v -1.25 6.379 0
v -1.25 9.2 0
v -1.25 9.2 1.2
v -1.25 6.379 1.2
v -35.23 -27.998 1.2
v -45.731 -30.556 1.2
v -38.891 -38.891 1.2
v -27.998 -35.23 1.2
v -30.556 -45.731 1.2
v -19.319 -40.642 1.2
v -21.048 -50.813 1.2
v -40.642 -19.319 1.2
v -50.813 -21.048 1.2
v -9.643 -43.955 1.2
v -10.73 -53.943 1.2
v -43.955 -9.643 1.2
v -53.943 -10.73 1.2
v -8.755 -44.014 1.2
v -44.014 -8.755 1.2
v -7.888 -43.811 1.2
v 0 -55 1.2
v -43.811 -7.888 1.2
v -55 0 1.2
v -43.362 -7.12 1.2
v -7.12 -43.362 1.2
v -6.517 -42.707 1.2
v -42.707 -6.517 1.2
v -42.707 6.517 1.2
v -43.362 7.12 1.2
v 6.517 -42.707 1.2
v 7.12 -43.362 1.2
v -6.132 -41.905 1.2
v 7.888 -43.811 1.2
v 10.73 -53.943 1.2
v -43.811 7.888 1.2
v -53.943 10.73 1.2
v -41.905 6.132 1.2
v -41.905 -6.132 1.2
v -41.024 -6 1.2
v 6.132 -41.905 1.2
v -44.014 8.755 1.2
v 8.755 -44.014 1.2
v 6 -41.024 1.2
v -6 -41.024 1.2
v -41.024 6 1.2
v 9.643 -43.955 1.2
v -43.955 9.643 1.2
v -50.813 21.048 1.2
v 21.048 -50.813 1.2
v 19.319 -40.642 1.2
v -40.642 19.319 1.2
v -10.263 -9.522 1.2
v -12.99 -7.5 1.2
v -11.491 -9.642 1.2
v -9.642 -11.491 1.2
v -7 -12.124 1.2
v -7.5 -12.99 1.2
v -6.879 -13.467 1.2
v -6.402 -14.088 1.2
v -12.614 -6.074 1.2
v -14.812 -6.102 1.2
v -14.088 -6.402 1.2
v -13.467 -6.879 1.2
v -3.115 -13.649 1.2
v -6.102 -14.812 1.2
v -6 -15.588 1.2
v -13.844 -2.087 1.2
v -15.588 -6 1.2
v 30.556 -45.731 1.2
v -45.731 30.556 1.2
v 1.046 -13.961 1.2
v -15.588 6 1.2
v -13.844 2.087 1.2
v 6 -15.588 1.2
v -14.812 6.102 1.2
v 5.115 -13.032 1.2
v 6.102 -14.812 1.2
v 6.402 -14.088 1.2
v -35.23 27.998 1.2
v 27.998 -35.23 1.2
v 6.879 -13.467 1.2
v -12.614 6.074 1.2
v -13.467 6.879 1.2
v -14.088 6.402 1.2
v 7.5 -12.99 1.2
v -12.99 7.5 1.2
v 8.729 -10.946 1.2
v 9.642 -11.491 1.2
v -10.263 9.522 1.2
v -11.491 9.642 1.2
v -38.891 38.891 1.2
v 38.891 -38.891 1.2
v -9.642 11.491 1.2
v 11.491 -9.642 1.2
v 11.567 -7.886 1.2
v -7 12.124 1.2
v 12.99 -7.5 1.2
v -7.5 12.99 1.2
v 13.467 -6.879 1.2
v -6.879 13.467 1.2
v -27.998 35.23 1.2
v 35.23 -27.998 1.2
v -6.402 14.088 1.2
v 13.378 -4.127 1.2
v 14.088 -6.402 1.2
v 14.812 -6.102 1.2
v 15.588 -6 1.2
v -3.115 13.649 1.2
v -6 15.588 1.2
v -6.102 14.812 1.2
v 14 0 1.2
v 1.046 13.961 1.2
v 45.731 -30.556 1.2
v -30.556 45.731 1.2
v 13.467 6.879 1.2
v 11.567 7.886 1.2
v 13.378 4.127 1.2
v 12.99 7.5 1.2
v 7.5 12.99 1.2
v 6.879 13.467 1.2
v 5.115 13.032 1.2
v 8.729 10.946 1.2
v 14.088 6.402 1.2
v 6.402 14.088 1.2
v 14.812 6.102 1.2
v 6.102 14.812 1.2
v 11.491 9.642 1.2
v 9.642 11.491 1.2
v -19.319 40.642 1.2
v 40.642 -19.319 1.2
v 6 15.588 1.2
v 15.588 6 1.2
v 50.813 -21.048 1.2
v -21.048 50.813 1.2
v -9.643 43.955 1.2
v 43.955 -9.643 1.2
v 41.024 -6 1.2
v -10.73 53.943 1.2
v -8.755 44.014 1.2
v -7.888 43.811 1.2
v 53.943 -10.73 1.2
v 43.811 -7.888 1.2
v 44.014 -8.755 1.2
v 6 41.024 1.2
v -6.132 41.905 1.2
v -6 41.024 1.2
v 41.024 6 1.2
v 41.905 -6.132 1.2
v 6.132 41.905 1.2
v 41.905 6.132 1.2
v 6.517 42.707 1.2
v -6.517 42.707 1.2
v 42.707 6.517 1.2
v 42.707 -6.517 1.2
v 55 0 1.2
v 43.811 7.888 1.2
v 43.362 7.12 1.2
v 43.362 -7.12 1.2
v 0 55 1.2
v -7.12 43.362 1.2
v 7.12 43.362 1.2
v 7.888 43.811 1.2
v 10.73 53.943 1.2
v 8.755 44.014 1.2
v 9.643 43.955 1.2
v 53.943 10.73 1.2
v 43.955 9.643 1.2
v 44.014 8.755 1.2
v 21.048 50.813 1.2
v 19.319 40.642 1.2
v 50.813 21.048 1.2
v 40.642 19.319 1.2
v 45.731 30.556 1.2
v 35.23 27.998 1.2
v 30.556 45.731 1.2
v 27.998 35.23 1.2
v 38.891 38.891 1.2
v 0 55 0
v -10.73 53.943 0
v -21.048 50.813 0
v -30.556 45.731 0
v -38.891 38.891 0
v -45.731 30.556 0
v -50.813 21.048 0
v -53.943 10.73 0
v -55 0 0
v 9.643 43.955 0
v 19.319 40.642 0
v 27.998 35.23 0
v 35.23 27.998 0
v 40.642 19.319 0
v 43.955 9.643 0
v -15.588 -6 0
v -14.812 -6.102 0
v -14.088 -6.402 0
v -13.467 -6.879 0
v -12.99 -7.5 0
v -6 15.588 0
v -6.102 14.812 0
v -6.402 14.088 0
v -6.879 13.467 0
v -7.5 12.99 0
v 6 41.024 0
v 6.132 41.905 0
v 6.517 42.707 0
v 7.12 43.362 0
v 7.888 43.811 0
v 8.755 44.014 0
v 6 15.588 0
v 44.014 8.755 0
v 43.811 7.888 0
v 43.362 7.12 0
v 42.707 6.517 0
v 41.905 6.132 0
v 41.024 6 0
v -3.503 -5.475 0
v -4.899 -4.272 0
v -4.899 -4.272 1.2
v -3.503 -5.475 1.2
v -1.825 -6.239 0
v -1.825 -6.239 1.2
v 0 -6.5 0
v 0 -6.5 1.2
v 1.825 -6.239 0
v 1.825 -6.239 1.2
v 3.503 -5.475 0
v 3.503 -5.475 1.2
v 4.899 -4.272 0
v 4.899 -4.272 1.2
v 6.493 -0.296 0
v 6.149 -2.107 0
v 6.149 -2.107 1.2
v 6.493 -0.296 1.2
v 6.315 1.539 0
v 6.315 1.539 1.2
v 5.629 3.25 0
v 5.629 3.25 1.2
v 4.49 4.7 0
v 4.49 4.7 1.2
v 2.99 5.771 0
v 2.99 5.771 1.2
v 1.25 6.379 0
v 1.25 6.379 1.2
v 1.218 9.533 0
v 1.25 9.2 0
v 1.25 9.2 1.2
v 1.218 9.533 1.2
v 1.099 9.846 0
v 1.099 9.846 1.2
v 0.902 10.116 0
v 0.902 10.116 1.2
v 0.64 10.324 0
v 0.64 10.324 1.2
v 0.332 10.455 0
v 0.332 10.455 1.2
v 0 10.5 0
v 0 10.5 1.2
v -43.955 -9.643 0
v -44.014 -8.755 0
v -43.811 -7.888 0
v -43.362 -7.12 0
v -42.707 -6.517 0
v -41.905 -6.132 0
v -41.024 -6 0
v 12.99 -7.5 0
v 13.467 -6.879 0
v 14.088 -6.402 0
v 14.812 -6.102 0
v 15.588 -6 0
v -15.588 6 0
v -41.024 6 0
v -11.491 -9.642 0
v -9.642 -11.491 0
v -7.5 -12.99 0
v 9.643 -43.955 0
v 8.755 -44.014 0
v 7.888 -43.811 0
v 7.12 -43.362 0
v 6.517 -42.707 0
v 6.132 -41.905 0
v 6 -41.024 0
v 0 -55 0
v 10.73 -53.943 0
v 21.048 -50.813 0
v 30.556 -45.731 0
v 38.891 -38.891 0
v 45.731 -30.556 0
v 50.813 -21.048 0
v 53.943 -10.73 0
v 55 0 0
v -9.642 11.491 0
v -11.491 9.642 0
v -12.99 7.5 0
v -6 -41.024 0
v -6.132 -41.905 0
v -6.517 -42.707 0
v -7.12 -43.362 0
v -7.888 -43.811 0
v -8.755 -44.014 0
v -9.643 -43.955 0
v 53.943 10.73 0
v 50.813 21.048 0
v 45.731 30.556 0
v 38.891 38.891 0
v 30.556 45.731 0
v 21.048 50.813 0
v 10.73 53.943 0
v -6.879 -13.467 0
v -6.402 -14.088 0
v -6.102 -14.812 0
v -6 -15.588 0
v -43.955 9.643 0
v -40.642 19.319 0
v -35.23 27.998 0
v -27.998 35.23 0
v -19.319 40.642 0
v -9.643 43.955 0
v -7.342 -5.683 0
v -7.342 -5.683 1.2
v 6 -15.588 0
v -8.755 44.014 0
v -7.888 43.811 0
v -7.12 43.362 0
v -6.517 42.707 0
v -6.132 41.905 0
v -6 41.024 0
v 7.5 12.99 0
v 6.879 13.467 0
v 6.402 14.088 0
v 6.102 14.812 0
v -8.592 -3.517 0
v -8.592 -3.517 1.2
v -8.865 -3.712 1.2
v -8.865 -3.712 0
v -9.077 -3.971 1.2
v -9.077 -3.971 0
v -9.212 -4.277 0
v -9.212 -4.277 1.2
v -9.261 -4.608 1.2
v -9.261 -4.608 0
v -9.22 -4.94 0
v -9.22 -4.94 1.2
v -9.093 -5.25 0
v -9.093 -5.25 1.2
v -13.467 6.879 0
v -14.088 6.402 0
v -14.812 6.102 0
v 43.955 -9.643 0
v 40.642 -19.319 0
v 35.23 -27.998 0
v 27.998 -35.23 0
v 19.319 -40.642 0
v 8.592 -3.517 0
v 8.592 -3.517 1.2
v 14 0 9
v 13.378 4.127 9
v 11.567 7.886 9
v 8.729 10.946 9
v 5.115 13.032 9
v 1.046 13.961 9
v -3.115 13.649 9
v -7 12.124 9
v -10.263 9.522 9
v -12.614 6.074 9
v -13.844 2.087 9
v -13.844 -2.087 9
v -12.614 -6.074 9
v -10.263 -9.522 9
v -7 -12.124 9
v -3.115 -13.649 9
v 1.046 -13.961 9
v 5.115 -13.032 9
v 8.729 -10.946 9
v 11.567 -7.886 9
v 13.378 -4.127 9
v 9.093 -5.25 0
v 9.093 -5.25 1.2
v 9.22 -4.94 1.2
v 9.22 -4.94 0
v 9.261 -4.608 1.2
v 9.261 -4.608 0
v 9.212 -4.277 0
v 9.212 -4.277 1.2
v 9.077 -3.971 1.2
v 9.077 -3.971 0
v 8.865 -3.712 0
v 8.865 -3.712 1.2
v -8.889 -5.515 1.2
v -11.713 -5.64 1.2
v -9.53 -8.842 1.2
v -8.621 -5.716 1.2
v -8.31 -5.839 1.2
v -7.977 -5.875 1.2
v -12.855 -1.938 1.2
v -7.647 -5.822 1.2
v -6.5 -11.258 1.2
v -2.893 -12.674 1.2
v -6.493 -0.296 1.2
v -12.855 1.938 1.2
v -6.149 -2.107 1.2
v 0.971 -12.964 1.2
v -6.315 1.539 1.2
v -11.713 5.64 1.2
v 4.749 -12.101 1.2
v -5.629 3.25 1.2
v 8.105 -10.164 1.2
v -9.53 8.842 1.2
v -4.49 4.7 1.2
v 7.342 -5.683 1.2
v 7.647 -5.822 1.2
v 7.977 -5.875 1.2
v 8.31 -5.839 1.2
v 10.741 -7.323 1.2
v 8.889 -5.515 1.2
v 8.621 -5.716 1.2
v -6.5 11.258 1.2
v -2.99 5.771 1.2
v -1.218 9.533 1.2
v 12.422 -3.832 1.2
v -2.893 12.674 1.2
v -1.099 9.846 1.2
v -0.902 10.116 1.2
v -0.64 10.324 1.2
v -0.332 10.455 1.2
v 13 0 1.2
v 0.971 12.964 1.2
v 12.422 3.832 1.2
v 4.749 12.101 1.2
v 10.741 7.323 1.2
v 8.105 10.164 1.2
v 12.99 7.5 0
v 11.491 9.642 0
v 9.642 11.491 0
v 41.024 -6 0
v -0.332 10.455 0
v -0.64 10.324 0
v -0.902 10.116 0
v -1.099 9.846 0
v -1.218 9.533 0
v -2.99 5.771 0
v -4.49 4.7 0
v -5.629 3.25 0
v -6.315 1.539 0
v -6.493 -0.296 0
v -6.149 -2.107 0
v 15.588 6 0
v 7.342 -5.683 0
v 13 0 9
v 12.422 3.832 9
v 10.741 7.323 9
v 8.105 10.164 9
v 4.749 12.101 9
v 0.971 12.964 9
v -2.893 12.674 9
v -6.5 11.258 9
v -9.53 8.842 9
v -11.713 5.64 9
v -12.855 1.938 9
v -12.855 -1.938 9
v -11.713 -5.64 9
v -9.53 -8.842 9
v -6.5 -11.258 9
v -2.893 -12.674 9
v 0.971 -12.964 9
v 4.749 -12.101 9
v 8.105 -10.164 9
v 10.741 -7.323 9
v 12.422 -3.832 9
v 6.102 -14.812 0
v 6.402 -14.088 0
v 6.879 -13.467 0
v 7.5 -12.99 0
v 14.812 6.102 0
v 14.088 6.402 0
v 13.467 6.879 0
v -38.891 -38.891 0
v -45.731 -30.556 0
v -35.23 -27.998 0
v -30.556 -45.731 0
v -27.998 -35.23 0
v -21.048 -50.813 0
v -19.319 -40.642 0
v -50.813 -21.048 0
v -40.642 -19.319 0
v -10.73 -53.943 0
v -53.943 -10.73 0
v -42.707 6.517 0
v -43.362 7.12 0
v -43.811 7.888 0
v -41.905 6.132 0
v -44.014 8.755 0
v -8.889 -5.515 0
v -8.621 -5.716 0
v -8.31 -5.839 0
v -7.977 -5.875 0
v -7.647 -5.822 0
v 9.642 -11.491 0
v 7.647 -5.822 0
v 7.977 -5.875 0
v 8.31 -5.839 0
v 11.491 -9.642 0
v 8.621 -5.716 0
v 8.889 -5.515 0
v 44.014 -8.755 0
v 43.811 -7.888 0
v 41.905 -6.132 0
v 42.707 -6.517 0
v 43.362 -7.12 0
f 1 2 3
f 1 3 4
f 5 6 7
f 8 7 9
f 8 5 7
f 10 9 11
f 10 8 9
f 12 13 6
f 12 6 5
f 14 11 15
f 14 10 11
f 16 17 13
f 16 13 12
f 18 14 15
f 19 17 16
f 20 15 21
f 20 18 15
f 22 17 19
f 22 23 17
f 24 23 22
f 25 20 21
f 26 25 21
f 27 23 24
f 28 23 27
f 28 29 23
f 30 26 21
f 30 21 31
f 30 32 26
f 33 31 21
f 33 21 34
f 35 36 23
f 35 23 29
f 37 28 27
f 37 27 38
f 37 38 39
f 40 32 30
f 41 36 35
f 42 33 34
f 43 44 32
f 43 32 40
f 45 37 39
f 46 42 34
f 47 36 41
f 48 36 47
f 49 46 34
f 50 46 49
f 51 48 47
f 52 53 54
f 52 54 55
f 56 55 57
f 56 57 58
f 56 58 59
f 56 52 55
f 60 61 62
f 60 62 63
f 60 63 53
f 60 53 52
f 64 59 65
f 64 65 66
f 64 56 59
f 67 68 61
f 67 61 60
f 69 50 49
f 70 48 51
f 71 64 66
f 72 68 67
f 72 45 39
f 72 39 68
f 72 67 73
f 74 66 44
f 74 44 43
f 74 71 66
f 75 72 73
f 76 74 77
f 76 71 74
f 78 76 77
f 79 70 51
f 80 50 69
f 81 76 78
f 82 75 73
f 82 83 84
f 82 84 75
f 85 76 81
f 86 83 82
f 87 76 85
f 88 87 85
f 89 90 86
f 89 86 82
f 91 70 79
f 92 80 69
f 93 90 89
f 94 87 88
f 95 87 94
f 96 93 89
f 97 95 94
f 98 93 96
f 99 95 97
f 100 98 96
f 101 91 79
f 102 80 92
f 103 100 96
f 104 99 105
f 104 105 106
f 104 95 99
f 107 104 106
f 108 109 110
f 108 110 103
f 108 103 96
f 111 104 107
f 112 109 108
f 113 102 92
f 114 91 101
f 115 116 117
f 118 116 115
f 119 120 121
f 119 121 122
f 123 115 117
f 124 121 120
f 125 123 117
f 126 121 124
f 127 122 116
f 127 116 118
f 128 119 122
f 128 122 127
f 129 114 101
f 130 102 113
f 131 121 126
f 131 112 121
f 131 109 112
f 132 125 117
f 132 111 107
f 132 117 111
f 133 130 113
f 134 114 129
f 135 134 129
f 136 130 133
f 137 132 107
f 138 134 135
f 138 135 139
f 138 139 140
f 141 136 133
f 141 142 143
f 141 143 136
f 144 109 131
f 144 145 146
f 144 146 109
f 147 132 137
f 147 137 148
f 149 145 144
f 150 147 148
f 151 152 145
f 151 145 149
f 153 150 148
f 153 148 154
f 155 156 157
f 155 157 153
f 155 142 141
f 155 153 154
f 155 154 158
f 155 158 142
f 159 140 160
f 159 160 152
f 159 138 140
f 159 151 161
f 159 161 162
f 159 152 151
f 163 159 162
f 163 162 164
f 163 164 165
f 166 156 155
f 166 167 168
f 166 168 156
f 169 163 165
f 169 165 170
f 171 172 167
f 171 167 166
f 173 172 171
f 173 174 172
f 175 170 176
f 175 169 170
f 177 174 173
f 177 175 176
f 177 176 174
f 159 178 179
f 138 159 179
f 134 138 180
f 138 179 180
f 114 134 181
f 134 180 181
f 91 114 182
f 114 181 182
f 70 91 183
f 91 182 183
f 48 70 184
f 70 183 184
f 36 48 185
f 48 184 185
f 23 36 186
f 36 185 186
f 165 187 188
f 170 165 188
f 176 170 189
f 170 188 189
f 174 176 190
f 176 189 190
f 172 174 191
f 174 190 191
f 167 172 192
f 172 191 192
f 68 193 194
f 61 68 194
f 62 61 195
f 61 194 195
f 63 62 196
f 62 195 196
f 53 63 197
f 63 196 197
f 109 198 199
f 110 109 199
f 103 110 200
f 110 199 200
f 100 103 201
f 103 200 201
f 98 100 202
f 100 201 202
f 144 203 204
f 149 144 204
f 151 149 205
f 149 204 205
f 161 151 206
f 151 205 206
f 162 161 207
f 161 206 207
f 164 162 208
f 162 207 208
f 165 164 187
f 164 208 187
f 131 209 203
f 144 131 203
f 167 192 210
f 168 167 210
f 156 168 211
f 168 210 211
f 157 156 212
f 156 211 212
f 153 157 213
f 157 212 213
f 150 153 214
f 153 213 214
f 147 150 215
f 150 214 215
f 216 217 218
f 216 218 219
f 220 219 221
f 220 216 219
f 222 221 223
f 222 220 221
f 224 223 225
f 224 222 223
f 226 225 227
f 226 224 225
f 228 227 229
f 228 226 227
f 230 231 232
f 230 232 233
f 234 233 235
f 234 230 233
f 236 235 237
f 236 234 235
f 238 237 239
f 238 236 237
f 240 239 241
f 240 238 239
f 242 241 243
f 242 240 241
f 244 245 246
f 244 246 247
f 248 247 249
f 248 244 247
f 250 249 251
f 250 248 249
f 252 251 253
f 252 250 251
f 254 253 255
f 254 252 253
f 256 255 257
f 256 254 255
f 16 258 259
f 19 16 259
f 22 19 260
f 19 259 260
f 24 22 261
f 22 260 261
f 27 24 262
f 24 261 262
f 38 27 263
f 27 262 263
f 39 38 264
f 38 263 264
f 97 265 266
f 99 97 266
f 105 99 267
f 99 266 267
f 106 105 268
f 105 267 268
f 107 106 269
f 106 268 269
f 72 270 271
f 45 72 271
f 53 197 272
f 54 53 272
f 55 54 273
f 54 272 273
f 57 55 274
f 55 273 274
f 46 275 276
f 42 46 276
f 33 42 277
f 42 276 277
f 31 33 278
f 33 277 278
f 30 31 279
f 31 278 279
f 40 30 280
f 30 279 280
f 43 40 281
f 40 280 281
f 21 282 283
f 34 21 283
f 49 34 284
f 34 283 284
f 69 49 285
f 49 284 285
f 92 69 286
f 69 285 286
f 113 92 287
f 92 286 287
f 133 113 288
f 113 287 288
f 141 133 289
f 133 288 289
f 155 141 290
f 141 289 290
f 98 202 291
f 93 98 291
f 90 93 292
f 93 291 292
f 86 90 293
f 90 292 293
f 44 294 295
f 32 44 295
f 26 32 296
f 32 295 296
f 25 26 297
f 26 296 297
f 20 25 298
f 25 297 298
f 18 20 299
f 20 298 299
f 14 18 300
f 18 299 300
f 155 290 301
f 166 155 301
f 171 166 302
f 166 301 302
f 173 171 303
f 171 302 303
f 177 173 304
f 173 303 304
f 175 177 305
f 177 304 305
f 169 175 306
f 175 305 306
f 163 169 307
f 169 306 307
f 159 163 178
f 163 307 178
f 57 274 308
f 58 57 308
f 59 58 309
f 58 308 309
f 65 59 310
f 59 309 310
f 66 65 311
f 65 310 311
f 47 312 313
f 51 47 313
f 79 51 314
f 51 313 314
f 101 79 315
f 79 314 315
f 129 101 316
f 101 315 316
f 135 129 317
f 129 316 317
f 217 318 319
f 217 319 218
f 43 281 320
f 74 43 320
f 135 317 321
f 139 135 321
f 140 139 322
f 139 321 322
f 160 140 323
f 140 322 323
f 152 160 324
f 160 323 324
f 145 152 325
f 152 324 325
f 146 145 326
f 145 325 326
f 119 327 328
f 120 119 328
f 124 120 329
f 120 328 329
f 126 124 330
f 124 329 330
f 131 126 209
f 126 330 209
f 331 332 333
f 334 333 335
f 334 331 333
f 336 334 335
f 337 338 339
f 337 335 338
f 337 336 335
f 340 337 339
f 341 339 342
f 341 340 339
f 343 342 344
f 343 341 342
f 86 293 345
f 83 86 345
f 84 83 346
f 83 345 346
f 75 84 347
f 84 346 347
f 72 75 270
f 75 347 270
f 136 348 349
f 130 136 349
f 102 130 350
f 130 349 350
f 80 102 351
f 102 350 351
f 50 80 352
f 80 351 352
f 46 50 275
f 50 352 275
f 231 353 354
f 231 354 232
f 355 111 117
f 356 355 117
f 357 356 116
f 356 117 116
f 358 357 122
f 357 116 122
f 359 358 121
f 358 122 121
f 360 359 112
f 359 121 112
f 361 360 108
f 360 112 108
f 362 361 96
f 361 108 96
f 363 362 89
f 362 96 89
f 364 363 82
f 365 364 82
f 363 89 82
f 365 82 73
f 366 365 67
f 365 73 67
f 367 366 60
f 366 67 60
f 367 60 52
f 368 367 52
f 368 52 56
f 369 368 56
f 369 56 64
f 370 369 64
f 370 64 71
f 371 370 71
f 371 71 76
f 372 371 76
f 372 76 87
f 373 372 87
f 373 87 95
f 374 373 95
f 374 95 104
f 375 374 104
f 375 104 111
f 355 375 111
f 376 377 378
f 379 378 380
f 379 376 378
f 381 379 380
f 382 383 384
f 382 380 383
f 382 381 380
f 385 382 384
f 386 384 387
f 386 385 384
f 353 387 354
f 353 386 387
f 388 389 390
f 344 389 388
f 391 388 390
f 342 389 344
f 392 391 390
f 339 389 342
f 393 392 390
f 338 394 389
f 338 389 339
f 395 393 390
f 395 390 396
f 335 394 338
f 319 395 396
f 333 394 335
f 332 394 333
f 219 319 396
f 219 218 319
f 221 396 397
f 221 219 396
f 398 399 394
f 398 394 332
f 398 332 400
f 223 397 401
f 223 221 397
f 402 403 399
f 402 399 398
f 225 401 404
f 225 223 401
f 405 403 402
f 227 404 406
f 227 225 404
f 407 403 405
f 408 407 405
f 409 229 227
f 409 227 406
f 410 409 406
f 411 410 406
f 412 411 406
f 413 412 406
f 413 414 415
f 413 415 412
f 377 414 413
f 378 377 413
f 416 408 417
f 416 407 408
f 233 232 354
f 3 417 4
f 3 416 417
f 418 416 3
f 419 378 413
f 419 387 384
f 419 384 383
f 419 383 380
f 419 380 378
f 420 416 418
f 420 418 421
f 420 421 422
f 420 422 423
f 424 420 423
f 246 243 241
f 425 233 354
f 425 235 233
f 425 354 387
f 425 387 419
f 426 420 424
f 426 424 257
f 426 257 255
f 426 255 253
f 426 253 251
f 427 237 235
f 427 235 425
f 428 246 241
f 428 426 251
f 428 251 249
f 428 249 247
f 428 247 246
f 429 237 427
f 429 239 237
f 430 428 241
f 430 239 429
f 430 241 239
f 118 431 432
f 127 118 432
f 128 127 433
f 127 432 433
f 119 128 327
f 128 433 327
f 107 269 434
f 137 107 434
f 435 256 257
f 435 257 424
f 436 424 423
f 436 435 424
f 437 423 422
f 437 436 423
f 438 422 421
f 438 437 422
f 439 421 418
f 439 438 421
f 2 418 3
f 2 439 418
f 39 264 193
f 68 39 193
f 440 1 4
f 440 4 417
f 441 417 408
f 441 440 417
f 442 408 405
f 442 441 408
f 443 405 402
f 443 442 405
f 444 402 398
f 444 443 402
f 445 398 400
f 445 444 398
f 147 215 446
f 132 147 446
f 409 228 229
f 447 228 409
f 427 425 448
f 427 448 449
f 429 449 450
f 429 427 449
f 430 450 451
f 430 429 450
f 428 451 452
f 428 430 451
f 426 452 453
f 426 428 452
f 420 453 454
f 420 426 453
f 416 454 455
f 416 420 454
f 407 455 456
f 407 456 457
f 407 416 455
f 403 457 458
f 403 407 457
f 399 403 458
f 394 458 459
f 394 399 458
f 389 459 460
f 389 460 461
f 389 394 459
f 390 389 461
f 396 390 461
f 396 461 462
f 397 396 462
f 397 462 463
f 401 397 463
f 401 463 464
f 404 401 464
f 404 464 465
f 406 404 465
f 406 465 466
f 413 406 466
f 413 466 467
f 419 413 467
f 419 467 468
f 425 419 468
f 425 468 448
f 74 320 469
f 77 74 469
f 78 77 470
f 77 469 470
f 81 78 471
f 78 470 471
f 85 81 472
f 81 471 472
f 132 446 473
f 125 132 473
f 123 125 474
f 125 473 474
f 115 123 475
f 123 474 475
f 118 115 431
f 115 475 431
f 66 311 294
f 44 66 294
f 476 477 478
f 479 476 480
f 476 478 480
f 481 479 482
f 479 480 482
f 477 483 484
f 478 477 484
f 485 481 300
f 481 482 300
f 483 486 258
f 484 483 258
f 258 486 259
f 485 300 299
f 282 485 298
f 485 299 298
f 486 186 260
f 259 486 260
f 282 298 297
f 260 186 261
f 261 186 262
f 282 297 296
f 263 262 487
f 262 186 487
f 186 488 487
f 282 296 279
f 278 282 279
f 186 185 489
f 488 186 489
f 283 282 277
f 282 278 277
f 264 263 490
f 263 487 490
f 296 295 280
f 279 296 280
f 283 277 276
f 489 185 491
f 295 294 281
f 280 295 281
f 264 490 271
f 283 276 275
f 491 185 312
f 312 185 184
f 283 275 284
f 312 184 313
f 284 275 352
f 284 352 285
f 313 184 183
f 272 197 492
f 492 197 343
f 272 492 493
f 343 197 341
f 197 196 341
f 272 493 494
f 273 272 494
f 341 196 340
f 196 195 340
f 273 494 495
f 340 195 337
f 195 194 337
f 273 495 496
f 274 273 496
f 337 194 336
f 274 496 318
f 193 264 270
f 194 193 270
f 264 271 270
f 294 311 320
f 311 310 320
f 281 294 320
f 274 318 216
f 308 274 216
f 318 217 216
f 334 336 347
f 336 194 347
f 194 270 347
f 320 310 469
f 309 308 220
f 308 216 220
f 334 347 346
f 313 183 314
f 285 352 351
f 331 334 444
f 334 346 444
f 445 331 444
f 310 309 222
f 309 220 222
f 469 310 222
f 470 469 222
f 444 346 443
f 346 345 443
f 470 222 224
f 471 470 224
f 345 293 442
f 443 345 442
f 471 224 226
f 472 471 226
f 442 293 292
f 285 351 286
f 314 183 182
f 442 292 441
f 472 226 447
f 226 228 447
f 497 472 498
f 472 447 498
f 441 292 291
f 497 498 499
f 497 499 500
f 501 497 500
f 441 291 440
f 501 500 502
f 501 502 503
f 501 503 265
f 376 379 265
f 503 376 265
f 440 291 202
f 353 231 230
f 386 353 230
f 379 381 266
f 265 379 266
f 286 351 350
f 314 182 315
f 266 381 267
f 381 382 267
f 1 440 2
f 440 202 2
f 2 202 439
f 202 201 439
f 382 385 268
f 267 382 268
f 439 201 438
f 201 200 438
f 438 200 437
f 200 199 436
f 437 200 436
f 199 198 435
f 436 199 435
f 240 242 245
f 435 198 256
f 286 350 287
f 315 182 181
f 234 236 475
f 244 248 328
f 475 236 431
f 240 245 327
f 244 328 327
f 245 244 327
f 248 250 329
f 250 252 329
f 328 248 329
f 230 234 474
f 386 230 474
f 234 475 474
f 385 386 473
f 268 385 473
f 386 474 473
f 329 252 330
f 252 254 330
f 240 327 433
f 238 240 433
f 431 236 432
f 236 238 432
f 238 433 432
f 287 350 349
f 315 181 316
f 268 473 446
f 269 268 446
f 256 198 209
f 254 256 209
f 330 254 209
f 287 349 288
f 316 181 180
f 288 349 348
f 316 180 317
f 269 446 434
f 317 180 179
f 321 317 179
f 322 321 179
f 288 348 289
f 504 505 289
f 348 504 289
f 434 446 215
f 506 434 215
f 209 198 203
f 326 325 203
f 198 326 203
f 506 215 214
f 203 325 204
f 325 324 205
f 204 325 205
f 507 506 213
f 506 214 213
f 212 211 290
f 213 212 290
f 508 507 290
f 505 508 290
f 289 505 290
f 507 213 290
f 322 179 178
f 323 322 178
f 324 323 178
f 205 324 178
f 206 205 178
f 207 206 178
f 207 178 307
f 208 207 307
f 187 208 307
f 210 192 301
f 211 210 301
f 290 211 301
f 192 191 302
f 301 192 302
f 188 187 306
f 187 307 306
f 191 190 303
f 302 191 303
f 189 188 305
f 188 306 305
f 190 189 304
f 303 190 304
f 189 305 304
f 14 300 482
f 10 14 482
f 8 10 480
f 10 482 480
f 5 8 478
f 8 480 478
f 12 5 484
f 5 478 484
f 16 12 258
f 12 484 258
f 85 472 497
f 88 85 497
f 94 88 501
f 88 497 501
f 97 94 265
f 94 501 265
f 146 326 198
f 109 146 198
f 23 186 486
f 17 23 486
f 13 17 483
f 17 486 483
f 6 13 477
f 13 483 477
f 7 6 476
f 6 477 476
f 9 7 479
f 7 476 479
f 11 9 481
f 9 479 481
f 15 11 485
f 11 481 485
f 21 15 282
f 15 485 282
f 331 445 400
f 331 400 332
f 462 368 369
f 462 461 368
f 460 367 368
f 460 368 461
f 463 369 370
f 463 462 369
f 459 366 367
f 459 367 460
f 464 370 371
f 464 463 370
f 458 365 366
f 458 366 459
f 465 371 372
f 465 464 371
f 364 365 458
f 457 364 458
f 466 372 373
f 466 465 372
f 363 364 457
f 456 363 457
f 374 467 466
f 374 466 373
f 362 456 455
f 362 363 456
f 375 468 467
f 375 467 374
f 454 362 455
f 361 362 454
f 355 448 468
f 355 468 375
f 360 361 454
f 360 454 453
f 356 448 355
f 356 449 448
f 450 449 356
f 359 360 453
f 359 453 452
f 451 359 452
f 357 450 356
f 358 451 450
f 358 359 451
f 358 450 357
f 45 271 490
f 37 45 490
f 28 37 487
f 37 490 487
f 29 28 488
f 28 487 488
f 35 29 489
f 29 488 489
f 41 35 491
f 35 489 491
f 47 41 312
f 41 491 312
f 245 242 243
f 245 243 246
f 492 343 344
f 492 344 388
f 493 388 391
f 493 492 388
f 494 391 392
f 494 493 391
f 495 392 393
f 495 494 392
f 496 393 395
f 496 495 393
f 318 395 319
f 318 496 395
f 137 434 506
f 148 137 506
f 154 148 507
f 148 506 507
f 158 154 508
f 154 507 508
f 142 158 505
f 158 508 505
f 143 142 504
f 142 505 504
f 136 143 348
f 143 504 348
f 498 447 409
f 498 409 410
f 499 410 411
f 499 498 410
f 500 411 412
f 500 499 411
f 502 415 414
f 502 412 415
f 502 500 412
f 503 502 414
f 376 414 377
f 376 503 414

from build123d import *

# Parameters (mm, degrees)
F1_DEPTH = 1.2
F2_R     = 14
F2_R_2   = 13
F3_DEPTH = 9
F5_DEPTH = 25


with BuildPart() as f1:
    # F0 (on Top) → F1 (new body)
    with BuildSketch(Plane.XY):
        with BuildLine():
            ThreePointArc((0, 55), (-38.890873, 38.890873), (-55, 0))
            ThreePointArc((-55, 0), (-38.890873, -38.890873), (0, -55))
            ThreePointArc((0, -55), (38.890873, -38.890873), (55, 0))
            ThreePointArc((55, 0), (38.890873, 38.890873), (0, 55))
        make_face()
        with BuildLine():
            ThreePointArc((-6, -41.024383), (-7.11965, -43.361964), (-9.642857, -43.954696))
            ThreePointArc((-9.642857, -43.954696), (-31.819805, -31.819805), (-43.954696, -9.642857))
            ThreePointArc((-43.954696, -9.642857), (-43.361964, -7.11965), (-41.024383, -6))
            Line((-41.024383, -6), (-15.588457, -6))
            ThreePointArc((-15.588457, -6), (-14.088457, -6.401924), (-12.990381, -7.5))
            ThreePointArc((-12.990381, -7.5), (-10.606602, -10.606602), (-7.5, -12.990381))
            ThreePointArc((-7.5, -12.990381), (-6.401924, -14.088457), (-6, -15.588457))
            Line((-6, -15.588457), (-6, -41.024383))
        make_face(mode=Mode.SUBTRACT)
        with BuildLine():
            ThreePointArc((41.024383, -6), (43.361964, -7.11965), (43.954696, -9.642857))
            ThreePointArc((43.954696, -9.642857), (31.819805, -31.819805), (9.642857, -43.954696))
            ThreePointArc((9.642857, -43.954696), (7.11965, -43.361964), (6, -41.024383))
            Line((6, -41.024383), (6, -15.588457))
            ThreePointArc((6, -15.588457), (6.401924, -14.088457), (7.5, -12.990381))
            ThreePointArc((7.5, -12.990381), (10.606602, -10.606602), (12.990381, -7.5))
            ThreePointArc((12.990381, -7.5), (14.088457, -6.401924), (15.588457, -6))
            Line((15.588457, -6), (41.024383, -6))
        make_face(mode=Mode.SUBTRACT)
        with BuildLine():
            ThreePointArc((-7.5, 12.990381), (-10.606602, 10.606602), (-12.990381, 7.5))
            ThreePointArc((-12.990381, 7.5), (-14.088457, 6.401924), (-15.588457, 6))
            Line((-15.588457, 6), (-41.024383, 6))
            ThreePointArc((-41.024383, 6), (-43.361964, 7.11965), (-43.954696, 9.642857))
            ThreePointArc((-43.954696, 9.642857), (-31.819805, 31.819805), (-9.642857, 43.954696))
            ThreePointArc((-9.642857, 43.954696), (-7.11965, 43.361964), (-6, 41.024383))
            Line((-6, 41.024383), (-6, 15.588457))
            ThreePointArc((-6, 15.588457), (-6.401924, 14.088457), (-7.5, 12.990381))
        make_face(mode=Mode.SUBTRACT)
        with BuildLine():
            ThreePointArc((6, 41.024383), (7.11965, 43.361964), (9.642857, 43.954696))
            ThreePointArc((9.642857, 43.954696), (31.819805, 31.819805), (43.954696, 9.642857))
            ThreePointArc((43.954696, 9.642857), (43.361964, 7.11965), (41.024383, 6))
            Line((41.024383, 6), (15.588457, 6))
            ThreePointArc((15.588457, 6), (14.088457, 6.401924), (12.990381, 7.5))
            ThreePointArc((12.990381, 7.5), (10.606602, 10.606602), (7.5, 12.990381))
            ThreePointArc((7.5, 12.990381), (6.401924, 14.088457), (6, 15.588457))
            Line((6, 15.588457), (6, 41.024383))
        make_face(mode=Mode.SUBTRACT)
    extrude(amount=F1_DEPTH)

    # F2 (on Top) → F3 (join)
    with BuildSketch(Plane.XY):
        Circle(F2_R)
        Circle(F2_R_2, mode=Mode.SUBTRACT)
    extrude(amount=F3_DEPTH)

    # F4 (on Top) → F5 (cut)
    with BuildSketch(Plane.XY):
        with BuildLine():
            ThreePointArc((-6.149095, -2.106806), (-5.916805, -2.690989), (-5.629165, -3.25))
            ThreePointArc((-5.629165, -3.25), (-5.288867, -3.778608), (-4.899095, -4.271869))
            ThreePointArc((-4.899095, -4.271869), (0, -6.5), (4.899095, -4.271869))
            ThreePointArc((4.899095, -4.271869), (5.288867, -3.778608), (5.629165, -3.25))
            ThreePointArc((5.629165, -3.25), (5.916805, -2.690989), (6.149095, -2.106806))
            ThreePointArc((6.149095, -2.106806), (5.629165, 3.25), (1.25, 6.378675))
            ThreePointArc((1.25, 6.378675), (0.627937, 6.469598), (0, 6.5))
            ThreePointArc((0, 6.5), (-0.627937, 6.469598), (-1.25, 6.378675))
            ThreePointArc((-1.25, 6.378675), (-5.629165, 3.25), (-6.149095, -2.106806))
        make_face()
        with BuildLine():
            ThreePointArc((-4.899095, -4.271869), (-5.288867, -3.778608), (-5.629165, -3.25))
            ThreePointArc((-5.629165, -3.25), (-5.916805, -2.690989), (-6.149095, -2.106806))
            Line((-6.149095, -2.106806), (-8.592399, -3.517448))
            ThreePointArc((-8.592399, -3.517448), (-9.211654, -4.277101), (-9.093267, -5.25))
            ThreePointArc((-9.093267, -5.25), (-8.309905, -5.838976), (-7.342399, -5.682512))
            Line((-7.342399, -5.682512), (-4.899095, -4.271869))
        make_face()
        with BuildLine():
            ThreePointArc((5.629165, -3.25), (5.288867, -3.778608), (4.899095, -4.271869))
            Line((4.899095, -4.271869), (7.342399, -5.682512))
            ThreePointArc((7.342399, -5.682512), (8.309905, -5.838976), (9.093267, -5.25))
            ThreePointArc((9.093267, -5.25), (9.211654, -4.277101), (8.592399, -3.517448))
            Line((8.592399, -3.517448), (6.149095, -2.106806))
            ThreePointArc((6.149095, -2.106806), (5.916805, -2.690989), (5.629165, -3.25))
        make_face()
        with BuildLine():
            Line((-1.25, 9.19996), (-1.25, 6.378675))
            ThreePointArc((-1.25, 6.378675), (-0.627937, 6.469598), (0, 6.5))
            ThreePointArc((0, 6.5), (0.627937, 6.469598), (1.25, 6.378675))
            Line((1.25, 6.378675), (1.25, 9.19996))
            ThreePointArc((1.25, 9.19996), (0.901749, 10.116077), (0, 10.5))
            ThreePointArc((0, 10.5), (-0.901749, 10.116077), (-1.25, 9.19996))
        make_face()
    extrude(amount=F5_DEPTH, mode=Mode.SUBTRACT)


solid = f1.part
